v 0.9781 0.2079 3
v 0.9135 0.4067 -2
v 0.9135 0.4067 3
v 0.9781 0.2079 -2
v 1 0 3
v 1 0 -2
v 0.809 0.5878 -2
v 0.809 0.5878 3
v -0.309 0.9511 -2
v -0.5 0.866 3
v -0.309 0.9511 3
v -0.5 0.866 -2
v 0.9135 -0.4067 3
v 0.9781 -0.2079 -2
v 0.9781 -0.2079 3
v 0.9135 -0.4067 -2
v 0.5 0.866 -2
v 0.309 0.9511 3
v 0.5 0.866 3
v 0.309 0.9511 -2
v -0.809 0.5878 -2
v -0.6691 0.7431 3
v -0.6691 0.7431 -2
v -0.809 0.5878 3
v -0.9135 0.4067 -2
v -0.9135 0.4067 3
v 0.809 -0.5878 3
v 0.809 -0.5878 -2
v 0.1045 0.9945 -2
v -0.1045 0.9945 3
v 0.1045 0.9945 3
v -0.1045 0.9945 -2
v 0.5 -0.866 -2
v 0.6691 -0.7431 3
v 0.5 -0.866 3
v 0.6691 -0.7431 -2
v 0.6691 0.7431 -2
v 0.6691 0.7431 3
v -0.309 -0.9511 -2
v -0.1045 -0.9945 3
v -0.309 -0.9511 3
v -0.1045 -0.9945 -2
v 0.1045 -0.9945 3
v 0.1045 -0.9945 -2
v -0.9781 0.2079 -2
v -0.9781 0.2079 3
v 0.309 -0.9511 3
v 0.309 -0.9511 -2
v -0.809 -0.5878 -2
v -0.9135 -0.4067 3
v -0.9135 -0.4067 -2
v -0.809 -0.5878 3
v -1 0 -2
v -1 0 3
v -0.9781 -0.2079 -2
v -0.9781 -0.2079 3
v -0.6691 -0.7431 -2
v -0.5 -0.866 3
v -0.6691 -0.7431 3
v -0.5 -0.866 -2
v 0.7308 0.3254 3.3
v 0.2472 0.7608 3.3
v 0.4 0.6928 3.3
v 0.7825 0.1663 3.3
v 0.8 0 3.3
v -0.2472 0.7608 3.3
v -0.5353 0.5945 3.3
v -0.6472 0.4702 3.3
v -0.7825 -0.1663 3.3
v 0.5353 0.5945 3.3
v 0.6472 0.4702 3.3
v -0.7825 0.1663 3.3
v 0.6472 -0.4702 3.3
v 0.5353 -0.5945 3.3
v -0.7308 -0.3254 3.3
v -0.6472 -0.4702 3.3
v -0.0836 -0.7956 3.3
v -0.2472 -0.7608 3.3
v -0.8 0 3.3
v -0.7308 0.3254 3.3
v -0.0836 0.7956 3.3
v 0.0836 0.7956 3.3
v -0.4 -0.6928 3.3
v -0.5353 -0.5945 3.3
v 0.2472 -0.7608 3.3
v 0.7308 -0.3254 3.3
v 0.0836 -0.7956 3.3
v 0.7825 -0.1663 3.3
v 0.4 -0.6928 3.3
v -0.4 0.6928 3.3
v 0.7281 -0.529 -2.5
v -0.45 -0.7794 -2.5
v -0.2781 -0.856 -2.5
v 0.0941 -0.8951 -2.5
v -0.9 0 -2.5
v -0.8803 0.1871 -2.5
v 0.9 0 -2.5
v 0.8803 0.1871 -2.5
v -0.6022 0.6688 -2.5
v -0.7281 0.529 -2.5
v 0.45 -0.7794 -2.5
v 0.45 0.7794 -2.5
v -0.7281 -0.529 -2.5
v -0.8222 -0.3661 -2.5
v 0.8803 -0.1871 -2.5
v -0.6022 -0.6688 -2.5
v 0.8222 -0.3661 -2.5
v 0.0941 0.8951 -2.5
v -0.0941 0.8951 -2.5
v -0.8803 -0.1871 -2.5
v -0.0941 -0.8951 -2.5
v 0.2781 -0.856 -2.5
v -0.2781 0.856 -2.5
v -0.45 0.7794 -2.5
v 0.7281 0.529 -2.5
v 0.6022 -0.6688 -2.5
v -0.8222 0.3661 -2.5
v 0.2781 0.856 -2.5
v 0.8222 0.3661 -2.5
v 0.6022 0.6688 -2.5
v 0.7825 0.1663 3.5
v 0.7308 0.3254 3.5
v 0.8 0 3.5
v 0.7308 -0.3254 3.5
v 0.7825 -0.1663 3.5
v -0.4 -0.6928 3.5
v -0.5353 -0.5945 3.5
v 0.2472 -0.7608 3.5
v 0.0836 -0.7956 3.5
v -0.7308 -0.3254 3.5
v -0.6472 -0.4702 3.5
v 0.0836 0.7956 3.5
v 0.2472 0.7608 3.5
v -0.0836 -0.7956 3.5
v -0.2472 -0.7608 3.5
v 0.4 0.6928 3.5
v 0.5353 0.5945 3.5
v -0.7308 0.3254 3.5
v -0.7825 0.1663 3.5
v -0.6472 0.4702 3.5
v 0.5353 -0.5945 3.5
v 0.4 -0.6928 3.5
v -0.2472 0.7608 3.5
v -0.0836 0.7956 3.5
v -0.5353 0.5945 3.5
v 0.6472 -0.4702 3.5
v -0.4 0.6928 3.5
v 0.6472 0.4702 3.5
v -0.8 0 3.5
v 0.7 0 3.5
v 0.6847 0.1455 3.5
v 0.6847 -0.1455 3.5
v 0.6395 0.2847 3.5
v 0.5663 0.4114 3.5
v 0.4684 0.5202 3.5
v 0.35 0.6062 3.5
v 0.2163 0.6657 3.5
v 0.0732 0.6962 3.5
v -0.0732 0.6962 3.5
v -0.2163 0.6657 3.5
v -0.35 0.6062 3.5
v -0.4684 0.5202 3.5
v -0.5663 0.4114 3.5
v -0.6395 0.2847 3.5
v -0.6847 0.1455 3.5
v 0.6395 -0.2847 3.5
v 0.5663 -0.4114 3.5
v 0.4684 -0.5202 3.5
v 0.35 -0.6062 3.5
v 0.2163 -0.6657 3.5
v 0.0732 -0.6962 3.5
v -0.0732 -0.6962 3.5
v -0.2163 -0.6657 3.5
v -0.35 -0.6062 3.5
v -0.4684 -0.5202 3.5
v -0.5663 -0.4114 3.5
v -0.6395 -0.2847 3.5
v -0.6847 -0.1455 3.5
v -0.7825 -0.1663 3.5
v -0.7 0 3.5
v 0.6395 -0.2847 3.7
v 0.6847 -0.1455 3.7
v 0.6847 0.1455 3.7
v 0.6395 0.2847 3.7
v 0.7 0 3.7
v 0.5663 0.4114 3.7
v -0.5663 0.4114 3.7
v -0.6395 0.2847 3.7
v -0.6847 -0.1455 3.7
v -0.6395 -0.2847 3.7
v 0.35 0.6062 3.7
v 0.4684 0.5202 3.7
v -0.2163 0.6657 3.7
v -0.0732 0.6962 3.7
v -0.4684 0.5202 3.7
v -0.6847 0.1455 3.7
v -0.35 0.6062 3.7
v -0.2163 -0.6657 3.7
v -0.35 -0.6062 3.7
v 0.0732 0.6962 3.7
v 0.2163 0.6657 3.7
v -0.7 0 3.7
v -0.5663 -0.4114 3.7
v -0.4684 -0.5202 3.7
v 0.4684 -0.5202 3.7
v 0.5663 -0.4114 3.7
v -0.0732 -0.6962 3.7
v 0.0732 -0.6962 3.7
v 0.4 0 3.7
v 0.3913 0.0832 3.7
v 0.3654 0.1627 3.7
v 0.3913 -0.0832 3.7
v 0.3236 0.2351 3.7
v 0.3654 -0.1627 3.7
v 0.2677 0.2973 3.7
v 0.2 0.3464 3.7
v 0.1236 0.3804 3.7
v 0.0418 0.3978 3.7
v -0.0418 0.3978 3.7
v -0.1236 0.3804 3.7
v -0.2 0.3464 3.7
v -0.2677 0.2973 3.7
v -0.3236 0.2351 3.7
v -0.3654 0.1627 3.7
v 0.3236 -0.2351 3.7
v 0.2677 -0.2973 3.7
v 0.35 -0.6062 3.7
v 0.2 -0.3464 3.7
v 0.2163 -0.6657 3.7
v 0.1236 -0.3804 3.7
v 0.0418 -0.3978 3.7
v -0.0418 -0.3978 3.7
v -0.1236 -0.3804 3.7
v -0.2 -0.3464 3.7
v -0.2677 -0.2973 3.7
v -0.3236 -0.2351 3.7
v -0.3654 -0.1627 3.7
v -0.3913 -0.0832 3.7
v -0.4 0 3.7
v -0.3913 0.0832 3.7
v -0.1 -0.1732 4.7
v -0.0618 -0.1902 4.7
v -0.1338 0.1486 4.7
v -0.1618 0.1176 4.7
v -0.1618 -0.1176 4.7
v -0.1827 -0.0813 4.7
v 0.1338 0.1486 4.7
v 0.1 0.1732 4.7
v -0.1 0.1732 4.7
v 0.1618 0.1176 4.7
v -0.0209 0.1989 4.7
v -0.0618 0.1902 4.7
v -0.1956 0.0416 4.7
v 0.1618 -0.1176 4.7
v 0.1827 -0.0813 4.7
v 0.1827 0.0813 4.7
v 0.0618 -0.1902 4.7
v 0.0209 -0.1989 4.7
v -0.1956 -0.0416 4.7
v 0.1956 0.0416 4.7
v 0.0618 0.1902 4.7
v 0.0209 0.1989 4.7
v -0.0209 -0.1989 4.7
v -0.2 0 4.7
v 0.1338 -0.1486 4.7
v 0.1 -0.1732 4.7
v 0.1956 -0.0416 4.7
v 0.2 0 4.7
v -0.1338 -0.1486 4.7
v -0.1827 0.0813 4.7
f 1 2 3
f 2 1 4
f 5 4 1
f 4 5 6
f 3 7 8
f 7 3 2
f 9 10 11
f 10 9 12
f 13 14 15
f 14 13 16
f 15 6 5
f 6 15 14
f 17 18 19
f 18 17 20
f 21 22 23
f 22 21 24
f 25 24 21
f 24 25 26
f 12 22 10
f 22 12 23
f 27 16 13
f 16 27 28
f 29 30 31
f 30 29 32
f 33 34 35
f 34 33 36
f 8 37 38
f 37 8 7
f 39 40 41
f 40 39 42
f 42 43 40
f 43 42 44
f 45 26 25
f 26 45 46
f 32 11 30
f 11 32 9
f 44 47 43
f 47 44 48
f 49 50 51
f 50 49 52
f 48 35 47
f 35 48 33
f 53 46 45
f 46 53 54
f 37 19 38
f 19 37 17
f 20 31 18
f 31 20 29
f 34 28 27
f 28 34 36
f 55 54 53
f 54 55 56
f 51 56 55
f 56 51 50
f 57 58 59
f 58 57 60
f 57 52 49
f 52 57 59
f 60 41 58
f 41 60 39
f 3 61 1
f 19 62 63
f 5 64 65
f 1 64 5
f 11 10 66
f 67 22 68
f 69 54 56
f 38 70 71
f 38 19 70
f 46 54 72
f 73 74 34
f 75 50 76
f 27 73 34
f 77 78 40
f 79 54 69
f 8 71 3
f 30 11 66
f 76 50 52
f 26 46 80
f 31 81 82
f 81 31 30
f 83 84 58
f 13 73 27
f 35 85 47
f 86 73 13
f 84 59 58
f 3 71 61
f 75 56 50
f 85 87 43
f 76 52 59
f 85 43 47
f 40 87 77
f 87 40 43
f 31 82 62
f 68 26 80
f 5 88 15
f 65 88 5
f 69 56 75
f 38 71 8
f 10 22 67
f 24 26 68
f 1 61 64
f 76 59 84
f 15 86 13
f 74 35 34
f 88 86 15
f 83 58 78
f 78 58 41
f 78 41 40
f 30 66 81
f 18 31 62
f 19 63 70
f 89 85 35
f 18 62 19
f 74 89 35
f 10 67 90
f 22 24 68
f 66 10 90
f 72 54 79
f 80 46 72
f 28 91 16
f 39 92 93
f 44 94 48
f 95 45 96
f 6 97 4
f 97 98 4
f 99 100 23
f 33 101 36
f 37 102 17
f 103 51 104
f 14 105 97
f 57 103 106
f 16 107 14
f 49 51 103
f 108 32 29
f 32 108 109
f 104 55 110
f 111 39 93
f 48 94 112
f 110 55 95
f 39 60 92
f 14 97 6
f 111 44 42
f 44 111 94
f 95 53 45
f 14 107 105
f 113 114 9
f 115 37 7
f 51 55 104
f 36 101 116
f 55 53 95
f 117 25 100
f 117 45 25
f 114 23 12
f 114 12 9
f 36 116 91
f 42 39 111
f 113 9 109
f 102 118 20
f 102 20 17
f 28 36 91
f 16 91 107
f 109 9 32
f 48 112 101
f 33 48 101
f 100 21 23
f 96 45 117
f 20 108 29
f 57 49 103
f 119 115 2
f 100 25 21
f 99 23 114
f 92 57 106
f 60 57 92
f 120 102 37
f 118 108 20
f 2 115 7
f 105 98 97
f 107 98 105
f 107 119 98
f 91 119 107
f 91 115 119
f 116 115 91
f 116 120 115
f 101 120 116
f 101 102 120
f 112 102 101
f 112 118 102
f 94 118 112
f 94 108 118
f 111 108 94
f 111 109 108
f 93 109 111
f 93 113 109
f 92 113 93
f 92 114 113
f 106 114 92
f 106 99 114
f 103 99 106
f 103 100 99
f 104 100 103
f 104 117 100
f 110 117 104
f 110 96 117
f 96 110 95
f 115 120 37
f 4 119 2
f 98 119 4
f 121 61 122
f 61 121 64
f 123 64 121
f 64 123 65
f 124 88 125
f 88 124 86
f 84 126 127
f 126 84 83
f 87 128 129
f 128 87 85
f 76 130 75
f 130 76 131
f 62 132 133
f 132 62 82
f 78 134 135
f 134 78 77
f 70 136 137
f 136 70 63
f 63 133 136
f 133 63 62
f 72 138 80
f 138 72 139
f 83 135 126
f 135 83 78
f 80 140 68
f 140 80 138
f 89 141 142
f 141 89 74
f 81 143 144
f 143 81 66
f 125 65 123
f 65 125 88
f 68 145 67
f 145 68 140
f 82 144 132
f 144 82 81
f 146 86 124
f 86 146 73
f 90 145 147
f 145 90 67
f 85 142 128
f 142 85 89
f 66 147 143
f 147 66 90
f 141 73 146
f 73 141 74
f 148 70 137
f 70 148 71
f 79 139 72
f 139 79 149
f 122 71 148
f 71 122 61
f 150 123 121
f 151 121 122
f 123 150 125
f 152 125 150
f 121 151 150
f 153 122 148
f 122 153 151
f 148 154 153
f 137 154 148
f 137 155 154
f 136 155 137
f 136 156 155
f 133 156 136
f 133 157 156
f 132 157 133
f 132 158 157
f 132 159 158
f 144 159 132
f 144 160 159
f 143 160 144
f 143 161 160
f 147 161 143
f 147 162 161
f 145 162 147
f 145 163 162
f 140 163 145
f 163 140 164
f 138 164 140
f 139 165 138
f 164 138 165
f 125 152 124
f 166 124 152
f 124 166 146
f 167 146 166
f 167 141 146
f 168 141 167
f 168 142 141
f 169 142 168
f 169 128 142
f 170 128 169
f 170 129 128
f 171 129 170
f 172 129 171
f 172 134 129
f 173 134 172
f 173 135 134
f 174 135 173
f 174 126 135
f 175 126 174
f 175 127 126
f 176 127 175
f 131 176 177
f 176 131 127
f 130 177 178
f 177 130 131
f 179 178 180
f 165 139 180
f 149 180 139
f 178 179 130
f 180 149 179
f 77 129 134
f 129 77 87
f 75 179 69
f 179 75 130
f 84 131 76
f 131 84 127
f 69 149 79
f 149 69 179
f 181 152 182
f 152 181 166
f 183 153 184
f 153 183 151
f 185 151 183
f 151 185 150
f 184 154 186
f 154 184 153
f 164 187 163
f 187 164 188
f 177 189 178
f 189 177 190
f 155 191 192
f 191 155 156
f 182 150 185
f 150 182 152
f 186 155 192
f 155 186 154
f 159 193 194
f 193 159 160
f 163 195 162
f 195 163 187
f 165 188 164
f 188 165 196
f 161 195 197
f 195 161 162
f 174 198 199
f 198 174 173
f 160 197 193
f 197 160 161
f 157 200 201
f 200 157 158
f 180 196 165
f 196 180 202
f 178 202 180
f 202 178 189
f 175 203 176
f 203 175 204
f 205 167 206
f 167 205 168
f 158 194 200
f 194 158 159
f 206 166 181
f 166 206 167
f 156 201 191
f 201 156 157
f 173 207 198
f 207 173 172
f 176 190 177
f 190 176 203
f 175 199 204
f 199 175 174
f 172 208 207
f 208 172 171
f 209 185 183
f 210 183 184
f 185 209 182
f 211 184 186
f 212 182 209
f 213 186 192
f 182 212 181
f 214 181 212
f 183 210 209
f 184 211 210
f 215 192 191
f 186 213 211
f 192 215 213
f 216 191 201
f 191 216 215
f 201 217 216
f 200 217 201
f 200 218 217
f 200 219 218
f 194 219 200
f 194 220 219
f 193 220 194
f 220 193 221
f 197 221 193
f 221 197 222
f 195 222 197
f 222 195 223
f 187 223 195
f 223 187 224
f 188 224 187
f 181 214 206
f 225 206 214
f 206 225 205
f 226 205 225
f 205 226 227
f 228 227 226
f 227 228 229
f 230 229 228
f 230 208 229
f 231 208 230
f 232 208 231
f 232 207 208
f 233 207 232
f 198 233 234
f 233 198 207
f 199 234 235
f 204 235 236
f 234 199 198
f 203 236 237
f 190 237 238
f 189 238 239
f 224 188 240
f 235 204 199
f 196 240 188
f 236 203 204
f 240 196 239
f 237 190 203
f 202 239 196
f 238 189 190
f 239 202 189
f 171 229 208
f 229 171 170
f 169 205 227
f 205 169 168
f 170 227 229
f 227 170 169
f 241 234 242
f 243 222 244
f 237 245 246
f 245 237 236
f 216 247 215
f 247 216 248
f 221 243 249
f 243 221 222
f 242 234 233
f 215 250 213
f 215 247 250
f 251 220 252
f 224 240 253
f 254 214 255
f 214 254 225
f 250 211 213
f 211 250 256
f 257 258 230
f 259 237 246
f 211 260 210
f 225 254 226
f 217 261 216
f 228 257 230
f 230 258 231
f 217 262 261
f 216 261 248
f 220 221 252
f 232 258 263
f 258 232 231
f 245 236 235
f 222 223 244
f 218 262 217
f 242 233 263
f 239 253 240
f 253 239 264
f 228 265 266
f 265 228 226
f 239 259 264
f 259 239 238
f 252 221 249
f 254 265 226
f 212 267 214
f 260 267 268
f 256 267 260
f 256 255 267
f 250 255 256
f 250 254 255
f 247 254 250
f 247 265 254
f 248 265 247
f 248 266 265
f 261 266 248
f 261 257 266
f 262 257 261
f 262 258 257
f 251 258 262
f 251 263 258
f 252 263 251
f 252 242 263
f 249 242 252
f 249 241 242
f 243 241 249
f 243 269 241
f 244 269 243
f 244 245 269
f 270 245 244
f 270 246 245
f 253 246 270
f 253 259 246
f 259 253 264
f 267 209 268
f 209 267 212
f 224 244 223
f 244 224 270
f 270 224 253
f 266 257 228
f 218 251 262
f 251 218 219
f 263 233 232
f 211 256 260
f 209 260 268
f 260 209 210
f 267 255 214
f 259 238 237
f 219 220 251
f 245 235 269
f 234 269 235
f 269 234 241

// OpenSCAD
color("#ec0606"){
translate([0,0,0.5])
cylinder(5, 1,1, $fn = 30, center = true);
}


color("#ec0606"){
translate([0,0,3])
cylinder(0.3, 1,0.8, $fn = 30);
}

color("#ec0606"){
translate([0,0,-2.5])
cylinder(0.5,0.9,1, $fn = 30);
}


color("#f9f2f2"){
translate([0,0,3.3])
cylinder(0.2, 0.8,0.8, $fn = 30);
}


color("#f9f2f2"){
translate([0,0,3.5])
cylinder(0.2, 0.7,0.7, $fn = 30);
}


color("#f9f2f2"){
translate([0,0,3.7])
cylinder(1, 0.4,0.2, $fn = 30);
}
